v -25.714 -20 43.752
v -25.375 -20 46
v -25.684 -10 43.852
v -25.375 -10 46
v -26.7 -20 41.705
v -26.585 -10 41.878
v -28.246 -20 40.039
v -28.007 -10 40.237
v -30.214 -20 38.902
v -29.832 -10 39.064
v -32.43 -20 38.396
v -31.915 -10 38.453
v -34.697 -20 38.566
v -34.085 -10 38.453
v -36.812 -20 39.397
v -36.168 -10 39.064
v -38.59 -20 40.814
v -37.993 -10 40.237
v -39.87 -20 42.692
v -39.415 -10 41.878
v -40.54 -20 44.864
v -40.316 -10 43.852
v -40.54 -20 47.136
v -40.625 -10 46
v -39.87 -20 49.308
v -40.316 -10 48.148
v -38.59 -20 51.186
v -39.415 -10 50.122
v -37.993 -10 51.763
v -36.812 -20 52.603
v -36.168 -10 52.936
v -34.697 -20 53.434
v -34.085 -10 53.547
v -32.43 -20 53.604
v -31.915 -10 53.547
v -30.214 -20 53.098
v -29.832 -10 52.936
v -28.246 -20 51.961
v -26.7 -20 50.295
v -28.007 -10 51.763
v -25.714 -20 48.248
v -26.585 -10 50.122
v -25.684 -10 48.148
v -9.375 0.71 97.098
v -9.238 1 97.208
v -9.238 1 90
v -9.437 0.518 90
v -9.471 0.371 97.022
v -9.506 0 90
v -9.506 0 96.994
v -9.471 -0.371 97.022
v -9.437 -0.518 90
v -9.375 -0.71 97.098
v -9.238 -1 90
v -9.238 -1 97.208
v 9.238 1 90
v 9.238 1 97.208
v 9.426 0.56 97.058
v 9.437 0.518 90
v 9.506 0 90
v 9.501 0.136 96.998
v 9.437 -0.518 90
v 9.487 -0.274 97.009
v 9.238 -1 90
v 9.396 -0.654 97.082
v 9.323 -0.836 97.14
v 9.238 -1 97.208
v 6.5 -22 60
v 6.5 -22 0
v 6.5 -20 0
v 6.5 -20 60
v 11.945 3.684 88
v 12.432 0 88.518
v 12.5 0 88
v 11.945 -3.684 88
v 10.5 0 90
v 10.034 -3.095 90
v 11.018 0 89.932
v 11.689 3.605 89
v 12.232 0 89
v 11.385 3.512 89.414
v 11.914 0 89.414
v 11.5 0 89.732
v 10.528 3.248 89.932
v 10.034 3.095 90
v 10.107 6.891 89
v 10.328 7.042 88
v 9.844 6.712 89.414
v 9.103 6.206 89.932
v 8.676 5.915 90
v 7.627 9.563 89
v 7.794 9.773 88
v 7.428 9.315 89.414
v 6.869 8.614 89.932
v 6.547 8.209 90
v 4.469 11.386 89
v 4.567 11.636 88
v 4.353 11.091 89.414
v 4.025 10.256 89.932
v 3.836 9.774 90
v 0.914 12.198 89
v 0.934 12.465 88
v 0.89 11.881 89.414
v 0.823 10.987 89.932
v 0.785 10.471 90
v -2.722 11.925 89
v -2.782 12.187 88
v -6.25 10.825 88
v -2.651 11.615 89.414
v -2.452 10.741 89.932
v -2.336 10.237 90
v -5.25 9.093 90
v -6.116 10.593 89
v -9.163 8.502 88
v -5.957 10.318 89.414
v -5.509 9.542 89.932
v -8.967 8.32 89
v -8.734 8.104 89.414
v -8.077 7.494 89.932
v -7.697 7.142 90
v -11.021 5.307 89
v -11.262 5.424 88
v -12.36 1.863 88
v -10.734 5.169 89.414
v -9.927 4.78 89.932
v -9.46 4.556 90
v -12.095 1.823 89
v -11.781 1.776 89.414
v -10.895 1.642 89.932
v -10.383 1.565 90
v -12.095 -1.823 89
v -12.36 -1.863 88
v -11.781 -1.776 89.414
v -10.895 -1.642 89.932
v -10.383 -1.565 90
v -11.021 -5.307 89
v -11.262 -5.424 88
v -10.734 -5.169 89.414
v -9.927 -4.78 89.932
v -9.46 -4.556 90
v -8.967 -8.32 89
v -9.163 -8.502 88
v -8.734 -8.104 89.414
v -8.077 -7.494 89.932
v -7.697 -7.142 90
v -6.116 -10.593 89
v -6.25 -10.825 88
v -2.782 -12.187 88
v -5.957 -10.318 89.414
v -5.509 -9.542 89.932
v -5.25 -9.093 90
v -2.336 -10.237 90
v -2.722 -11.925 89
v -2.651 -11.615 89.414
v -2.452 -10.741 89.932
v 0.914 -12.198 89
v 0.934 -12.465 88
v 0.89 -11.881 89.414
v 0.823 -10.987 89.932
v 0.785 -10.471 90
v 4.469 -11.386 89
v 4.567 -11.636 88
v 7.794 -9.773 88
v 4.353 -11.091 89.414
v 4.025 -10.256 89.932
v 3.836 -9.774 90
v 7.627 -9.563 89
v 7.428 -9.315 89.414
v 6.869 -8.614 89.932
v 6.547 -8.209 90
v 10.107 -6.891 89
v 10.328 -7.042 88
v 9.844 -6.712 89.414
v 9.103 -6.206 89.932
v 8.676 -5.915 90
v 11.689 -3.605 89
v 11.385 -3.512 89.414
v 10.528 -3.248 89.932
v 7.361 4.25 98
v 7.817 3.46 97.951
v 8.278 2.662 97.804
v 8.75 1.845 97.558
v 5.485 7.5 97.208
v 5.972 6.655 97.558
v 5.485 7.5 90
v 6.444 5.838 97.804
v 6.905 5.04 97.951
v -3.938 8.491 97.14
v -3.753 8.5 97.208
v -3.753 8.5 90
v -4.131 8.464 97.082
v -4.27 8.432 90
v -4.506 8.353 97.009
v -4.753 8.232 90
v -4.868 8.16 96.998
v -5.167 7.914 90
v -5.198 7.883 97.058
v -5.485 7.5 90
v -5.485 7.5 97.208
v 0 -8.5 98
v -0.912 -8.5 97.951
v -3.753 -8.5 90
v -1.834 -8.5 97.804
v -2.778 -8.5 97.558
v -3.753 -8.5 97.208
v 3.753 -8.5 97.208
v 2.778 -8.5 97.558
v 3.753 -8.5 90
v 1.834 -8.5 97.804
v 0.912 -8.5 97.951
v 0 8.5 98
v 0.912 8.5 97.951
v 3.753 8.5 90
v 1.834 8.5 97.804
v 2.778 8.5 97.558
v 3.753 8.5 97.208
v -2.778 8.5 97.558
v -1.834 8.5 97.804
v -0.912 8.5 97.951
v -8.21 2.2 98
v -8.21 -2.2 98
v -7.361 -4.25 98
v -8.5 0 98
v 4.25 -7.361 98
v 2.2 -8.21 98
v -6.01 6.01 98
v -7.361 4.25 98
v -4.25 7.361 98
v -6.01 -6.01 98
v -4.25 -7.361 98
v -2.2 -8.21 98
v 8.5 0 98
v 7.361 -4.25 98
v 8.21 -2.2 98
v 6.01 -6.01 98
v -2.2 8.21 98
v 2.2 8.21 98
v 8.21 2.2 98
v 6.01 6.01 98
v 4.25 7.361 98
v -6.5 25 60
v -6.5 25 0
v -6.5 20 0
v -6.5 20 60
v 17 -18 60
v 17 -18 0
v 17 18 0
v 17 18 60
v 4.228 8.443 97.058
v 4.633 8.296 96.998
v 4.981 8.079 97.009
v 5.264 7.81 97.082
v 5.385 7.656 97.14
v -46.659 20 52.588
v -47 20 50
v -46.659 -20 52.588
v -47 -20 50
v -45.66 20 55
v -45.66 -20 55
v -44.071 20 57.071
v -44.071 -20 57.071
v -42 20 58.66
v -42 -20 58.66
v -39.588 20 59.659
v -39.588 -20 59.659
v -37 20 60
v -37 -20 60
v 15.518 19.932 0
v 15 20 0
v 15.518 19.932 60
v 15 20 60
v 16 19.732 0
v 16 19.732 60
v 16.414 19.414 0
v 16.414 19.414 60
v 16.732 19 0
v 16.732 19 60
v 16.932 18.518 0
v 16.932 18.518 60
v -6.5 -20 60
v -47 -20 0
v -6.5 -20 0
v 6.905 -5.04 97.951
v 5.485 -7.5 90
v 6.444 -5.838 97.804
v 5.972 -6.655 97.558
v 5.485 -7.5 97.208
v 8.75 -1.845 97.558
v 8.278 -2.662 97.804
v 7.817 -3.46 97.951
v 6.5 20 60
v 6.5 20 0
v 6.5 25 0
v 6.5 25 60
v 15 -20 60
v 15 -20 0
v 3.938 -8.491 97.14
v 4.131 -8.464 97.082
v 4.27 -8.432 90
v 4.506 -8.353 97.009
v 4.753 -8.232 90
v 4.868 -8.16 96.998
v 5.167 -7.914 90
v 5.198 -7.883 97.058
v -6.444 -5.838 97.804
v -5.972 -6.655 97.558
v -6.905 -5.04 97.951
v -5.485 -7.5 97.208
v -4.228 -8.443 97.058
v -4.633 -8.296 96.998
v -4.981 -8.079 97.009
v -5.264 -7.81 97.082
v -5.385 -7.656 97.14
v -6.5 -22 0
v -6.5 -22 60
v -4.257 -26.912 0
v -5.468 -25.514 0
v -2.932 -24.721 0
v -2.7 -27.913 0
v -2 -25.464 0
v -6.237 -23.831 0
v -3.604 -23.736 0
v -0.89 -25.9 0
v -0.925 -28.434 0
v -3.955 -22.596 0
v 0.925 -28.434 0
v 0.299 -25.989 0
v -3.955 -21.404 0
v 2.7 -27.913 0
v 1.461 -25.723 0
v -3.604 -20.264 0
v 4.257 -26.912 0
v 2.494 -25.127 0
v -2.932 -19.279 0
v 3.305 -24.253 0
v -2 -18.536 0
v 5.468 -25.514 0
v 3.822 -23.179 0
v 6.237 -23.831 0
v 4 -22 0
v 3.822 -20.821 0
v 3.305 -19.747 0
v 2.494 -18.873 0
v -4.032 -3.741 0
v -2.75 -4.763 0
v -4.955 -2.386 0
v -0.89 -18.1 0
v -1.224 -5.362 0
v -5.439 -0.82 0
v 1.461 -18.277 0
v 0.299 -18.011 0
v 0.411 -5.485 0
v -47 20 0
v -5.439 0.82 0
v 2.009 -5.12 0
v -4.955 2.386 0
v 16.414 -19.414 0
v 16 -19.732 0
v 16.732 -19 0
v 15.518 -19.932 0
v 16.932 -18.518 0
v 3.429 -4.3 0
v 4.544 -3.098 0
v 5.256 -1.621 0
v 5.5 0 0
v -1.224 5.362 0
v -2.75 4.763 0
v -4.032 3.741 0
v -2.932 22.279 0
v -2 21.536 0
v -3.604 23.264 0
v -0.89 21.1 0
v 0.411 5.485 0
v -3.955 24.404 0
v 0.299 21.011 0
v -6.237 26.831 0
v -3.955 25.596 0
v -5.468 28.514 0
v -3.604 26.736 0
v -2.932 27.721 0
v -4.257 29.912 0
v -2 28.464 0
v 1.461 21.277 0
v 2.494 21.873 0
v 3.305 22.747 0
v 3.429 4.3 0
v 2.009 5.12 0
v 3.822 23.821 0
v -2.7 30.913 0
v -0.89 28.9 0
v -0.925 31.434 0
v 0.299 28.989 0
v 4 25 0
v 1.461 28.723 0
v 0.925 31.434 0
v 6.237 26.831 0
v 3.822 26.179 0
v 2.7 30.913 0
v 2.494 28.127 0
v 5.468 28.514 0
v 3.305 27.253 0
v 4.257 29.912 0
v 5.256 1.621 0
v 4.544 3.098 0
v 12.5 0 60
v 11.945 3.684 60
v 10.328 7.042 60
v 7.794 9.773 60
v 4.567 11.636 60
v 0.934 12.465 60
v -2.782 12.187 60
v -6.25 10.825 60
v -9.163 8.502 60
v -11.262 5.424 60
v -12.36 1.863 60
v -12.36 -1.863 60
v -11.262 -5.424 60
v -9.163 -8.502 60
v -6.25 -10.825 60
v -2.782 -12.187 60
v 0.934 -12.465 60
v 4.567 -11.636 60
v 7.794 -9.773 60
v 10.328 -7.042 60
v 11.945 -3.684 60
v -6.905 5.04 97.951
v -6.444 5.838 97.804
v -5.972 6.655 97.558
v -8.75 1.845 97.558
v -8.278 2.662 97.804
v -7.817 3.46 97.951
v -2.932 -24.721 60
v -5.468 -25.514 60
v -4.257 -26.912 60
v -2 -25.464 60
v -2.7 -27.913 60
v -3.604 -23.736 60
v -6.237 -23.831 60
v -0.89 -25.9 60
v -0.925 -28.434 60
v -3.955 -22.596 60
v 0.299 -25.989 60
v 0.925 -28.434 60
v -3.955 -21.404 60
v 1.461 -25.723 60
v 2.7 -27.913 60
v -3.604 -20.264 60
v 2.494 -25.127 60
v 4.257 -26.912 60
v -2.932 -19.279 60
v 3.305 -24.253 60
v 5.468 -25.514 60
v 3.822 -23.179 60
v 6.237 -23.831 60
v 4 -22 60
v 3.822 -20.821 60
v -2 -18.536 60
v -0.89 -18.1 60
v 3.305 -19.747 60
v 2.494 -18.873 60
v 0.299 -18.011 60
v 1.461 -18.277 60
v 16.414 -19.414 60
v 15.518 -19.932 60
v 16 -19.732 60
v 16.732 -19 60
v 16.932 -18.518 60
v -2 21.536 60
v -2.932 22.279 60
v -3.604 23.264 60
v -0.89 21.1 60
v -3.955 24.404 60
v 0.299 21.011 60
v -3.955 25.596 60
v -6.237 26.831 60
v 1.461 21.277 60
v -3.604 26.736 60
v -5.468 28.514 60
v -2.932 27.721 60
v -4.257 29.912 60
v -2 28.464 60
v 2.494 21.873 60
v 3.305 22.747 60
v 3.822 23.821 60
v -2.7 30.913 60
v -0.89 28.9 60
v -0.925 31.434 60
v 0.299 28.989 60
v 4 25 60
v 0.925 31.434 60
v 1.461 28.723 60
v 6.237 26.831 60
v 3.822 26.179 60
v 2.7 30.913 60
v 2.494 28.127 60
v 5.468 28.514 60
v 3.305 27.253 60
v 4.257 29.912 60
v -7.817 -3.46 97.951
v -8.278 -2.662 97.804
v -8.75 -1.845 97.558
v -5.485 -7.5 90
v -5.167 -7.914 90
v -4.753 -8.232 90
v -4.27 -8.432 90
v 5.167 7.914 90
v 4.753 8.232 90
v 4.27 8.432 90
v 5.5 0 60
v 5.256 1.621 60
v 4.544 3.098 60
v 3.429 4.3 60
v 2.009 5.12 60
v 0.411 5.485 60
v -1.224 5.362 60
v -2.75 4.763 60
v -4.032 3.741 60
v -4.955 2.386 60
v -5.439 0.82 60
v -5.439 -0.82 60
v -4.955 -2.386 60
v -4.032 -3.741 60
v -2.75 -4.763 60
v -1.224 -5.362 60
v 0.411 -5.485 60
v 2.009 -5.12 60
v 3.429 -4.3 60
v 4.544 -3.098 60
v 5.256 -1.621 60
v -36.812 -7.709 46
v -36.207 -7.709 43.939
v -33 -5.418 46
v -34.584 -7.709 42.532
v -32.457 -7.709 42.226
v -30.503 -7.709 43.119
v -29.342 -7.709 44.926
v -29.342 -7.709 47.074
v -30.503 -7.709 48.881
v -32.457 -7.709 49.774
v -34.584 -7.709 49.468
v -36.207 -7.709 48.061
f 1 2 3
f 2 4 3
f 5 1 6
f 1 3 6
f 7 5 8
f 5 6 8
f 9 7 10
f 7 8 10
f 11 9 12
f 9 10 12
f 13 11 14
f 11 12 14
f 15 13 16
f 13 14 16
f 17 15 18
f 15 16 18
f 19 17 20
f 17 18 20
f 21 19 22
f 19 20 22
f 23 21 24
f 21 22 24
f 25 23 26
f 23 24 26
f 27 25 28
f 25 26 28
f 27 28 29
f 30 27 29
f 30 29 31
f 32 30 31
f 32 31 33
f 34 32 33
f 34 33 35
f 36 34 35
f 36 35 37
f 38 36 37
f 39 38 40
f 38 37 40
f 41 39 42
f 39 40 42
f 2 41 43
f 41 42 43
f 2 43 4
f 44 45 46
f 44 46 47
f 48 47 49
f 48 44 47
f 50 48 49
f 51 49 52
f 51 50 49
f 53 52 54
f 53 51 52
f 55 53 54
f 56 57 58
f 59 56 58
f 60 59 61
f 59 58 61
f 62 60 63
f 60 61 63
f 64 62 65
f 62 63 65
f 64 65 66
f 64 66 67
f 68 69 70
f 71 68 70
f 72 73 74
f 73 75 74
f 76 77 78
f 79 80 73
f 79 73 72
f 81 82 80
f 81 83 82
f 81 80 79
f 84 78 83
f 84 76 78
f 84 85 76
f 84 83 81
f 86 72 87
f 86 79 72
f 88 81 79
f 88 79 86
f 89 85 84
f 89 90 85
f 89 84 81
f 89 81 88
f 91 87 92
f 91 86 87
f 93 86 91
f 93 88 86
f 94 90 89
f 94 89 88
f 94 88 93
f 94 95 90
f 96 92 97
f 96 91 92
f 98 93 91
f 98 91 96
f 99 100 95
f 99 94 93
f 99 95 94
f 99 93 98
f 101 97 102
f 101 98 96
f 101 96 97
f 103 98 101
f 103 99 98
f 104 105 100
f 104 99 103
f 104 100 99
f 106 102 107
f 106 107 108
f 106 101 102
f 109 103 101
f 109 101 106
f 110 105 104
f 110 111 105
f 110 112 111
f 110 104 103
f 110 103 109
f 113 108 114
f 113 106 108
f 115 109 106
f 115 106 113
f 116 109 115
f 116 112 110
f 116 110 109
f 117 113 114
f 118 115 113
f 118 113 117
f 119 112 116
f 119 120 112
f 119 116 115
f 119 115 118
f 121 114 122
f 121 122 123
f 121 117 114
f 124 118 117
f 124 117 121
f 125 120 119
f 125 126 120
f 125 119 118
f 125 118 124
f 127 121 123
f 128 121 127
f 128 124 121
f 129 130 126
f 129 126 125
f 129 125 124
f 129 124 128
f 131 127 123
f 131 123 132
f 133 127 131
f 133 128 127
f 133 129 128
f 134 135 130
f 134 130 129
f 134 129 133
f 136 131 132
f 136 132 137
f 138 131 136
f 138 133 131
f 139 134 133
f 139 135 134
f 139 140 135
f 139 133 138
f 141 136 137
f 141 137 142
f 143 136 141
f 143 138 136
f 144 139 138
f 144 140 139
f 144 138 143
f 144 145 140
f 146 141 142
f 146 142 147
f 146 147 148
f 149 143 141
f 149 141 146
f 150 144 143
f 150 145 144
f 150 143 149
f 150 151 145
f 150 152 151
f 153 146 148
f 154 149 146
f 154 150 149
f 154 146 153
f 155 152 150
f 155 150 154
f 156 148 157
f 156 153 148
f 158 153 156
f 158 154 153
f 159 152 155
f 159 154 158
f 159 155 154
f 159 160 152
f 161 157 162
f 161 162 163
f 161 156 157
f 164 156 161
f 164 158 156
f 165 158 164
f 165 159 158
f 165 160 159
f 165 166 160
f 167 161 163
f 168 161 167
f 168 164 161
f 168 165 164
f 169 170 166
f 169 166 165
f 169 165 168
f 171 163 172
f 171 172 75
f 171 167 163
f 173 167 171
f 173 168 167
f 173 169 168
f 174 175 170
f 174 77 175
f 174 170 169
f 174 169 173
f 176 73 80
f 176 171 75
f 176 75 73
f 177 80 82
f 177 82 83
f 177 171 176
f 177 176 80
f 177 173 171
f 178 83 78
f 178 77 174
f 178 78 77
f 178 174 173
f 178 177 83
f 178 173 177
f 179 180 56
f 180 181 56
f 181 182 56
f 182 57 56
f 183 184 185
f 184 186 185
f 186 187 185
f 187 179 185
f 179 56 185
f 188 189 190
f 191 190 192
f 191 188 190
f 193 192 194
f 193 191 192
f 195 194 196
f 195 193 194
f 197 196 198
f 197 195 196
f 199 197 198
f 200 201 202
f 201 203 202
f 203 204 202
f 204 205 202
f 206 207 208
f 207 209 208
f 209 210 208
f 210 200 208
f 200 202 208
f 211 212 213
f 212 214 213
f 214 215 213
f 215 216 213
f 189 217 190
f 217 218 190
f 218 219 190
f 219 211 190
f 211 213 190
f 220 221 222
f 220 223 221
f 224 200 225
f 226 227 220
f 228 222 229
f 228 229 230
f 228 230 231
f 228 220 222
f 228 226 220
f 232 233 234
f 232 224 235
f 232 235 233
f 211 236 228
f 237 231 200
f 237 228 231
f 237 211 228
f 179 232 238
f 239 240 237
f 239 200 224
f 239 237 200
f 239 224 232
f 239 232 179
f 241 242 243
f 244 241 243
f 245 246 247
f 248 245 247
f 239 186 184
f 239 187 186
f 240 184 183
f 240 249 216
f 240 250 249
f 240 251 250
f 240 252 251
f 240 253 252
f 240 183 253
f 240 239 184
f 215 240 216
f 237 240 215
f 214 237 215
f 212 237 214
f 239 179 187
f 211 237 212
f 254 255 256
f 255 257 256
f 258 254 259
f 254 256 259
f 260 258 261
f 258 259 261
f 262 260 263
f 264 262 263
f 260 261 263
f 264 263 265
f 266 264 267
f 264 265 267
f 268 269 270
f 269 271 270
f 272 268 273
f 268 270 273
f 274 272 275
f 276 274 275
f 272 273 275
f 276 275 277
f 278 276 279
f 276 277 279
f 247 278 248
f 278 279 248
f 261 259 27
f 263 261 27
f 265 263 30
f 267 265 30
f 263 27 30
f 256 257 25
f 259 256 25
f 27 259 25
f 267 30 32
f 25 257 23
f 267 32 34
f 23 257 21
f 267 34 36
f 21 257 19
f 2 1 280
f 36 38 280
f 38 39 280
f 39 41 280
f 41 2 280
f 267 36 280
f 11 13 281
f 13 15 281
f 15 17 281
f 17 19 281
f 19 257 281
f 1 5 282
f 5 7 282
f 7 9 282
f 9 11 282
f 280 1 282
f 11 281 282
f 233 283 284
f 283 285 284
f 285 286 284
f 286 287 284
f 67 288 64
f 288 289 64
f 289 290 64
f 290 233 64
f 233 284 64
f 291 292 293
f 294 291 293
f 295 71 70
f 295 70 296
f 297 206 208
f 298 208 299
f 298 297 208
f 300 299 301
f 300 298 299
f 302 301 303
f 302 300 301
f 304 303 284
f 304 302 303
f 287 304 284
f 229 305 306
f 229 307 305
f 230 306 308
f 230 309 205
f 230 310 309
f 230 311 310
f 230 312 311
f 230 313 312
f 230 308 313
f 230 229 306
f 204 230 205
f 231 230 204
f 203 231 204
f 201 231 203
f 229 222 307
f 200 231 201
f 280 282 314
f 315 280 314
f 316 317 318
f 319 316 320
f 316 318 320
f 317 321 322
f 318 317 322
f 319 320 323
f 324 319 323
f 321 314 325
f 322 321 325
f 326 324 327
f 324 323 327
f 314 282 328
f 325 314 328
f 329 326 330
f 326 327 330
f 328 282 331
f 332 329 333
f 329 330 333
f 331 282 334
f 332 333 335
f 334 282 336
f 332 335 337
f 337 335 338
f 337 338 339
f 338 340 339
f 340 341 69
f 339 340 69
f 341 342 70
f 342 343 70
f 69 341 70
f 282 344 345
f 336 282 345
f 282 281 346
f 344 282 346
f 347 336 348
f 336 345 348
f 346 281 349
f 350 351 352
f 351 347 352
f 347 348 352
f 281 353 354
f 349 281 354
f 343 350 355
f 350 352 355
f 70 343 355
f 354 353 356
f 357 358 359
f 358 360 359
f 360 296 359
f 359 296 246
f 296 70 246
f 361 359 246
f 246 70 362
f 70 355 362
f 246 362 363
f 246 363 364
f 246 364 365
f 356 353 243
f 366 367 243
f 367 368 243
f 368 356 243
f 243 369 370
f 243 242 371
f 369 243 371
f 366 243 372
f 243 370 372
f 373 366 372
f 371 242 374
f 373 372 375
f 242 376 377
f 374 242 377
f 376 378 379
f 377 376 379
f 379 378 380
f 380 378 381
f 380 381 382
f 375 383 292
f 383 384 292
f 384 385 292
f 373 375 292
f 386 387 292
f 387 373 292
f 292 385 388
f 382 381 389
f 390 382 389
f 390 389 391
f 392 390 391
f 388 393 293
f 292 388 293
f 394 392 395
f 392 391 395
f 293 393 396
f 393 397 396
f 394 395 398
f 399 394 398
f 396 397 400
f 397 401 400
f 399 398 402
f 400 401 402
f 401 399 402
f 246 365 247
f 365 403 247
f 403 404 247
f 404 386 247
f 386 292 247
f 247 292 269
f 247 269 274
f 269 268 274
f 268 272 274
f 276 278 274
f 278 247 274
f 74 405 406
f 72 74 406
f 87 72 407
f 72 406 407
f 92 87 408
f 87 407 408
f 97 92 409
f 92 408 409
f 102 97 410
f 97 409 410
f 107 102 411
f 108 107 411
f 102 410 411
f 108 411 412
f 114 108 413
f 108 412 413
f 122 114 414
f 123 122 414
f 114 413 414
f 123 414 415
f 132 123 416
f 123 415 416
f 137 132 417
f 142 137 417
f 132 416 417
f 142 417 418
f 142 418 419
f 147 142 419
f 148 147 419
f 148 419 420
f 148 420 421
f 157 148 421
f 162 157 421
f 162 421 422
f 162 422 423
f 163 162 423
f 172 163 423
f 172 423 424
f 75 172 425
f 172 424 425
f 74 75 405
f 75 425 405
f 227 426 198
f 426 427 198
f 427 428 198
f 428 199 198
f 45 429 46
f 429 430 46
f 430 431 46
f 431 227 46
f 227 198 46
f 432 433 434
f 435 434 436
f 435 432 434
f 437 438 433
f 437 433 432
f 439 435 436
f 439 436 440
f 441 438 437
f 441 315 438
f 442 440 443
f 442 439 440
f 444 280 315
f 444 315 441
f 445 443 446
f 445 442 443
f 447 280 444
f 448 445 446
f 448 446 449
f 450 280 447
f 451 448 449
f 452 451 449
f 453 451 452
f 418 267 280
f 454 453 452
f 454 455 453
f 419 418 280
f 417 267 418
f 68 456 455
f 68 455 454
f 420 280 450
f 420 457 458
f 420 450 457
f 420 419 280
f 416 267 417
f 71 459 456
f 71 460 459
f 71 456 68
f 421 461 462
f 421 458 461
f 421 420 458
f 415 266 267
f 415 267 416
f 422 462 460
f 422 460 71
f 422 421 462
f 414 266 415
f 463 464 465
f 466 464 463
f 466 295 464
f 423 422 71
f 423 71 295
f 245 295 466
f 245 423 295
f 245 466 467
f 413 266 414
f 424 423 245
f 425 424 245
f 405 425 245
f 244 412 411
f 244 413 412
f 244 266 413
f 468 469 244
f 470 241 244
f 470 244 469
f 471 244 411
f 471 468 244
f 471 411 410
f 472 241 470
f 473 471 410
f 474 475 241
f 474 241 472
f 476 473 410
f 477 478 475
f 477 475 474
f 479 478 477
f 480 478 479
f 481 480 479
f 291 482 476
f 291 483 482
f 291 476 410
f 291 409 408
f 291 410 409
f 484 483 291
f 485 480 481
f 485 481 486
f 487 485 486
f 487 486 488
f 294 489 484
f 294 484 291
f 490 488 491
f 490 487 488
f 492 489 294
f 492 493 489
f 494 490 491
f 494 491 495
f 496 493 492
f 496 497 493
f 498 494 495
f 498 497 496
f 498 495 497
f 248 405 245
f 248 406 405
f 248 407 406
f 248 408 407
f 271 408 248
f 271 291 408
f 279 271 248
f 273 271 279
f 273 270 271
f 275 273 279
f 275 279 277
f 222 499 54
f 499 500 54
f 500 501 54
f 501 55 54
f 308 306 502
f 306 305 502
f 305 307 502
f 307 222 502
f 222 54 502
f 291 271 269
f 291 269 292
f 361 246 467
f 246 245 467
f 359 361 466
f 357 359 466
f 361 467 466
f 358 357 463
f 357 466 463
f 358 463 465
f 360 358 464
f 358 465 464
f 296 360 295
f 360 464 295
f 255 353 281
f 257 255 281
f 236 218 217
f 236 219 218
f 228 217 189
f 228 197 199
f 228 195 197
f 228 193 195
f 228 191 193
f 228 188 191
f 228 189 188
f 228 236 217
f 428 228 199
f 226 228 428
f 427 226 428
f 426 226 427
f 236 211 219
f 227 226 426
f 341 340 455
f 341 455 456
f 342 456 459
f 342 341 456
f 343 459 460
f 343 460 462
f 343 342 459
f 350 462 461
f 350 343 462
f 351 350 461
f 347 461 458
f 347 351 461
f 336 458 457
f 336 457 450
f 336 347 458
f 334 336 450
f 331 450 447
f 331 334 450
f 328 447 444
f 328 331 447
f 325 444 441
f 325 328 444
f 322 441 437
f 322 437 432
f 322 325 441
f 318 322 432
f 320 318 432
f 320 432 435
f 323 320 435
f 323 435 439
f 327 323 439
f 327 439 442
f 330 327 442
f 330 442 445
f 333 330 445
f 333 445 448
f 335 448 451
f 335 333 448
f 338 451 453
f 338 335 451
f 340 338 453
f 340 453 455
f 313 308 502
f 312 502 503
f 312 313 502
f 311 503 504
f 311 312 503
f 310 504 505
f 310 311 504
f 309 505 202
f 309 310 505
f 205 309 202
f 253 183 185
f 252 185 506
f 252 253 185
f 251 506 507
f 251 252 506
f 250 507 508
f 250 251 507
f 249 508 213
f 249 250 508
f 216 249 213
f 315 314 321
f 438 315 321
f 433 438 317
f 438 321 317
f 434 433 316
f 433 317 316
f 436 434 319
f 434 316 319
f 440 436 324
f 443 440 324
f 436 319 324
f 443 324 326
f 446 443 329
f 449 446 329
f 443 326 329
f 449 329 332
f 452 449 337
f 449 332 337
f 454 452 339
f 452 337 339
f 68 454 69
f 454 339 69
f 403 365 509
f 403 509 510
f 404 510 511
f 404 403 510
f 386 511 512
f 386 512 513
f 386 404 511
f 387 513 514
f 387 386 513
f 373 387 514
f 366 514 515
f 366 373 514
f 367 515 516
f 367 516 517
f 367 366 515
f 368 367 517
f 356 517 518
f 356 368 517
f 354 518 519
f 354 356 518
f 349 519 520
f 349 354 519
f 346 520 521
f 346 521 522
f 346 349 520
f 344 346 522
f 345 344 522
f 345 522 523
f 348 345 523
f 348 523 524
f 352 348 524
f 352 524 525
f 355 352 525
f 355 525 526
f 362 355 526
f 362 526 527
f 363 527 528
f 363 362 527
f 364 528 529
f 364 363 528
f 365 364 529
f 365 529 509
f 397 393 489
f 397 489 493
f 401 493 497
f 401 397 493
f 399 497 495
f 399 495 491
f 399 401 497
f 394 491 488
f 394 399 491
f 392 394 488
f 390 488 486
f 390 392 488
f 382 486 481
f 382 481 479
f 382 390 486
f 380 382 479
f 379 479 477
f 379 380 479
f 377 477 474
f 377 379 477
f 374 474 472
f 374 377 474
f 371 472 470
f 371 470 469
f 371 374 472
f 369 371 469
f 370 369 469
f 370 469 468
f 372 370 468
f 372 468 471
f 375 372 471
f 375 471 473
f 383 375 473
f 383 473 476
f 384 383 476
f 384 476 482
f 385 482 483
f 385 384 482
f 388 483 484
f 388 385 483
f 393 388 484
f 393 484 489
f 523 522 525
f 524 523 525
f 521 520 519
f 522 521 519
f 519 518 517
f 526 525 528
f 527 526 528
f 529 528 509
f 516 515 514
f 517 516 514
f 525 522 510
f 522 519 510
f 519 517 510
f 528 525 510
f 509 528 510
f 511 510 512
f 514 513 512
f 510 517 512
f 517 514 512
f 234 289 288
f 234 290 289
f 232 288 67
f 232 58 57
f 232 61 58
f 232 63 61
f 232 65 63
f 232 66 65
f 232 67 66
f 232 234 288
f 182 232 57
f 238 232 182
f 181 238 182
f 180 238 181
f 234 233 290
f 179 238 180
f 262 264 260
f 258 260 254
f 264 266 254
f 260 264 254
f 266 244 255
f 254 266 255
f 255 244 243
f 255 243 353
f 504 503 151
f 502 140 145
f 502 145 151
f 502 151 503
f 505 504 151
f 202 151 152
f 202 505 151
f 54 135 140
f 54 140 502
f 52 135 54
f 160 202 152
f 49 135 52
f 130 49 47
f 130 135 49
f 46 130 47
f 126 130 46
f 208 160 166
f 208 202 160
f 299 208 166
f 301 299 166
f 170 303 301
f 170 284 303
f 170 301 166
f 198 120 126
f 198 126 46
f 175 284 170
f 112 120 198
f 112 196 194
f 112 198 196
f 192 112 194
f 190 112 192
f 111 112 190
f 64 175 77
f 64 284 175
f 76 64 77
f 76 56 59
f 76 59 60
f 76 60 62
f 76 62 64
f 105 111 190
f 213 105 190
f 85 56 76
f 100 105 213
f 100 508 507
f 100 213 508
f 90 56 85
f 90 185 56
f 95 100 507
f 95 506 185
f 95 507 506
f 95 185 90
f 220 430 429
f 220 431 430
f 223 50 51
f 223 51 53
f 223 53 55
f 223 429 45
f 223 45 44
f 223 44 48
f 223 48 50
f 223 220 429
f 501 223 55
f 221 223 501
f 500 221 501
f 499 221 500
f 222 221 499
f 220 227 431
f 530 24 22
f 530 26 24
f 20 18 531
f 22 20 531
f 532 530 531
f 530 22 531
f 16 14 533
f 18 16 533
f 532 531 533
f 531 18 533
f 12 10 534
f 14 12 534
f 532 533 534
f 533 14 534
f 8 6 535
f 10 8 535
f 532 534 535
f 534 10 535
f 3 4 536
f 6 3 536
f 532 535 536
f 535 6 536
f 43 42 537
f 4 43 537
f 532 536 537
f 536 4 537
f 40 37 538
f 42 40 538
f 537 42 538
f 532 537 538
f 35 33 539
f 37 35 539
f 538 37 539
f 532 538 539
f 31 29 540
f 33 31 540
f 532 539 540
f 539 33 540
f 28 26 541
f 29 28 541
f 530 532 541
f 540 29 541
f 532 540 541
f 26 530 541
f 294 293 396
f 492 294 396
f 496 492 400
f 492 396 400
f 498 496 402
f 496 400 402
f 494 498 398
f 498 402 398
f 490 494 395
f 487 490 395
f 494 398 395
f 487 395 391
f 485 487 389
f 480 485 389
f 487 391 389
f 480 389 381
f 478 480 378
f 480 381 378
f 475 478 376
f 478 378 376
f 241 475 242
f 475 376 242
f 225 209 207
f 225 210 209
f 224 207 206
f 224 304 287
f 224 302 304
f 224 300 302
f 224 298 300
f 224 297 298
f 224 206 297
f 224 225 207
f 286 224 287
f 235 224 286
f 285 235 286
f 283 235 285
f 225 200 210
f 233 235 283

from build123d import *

# Parameters (mm, degrees)
SKETCH_1_R               = 4
SKETCH_1_R_2             = 5.5
EXTRUDE_1_DEPTH          = 60
FILLET_1_R               = 10
SKETCH_2_R               = 12.5
EXTRUDE_2_DEPTH          = 30
HOLE_WIZARD_G3_8_1_D     = 15.25
HOLE_WIZARD_G3_8_1_DEPTH = 10
HOLE_WIZARD_G3_8_1_TIP   = 4.58156222
EXTRUDE_3_DEPTH          = 8
FILLET_2_R               = 2
FILLET_3_R               = 2


with BuildPart() as part:
    # 草图1 → 凸台-拉伸1 (new body)
    with BuildSketch(Plane.XY):
        with BuildLine():
            Line((-6.5, 25), (-6.5, 20))
            Line((-6.5, 20), (-47, 20))
            Line((-47, 20), (-47, -20))
            Line((-47, -20), (-6.5, -20))
            Line((-6.5, -20), (-6.5, -22))
            ThreePointArc((-6.5, -22), (0, -28.5), (6.5, -22))
            Line((6.5, -22), (6.5, -20))
            Line((6.5, -20), (17, -20))
            Line((17, -20), (17, 20))
            Line((17, 20), (6.5, 20))
            Line((6.5, 20), (6.5, 25))
            ThreePointArc((6.5, 25), (0, 31.5), (-6.5, 25))
        make_face()
        with Locations((0, 25)):
            Circle(SKETCH_1_R, mode=Mode.SUBTRACT)
        with Locations((0, -22)):
            Circle(SKETCH_1_R, mode=Mode.SUBTRACT)
        Circle(SKETCH_1_R_2, mode=Mode.SUBTRACT)
    extrude(amount=EXTRUDE_1_DEPTH)

    # 圆角1
    fillet_1_edges = [part.edges().sort_by_distance(p)[0] for p in [
        (-47, 0, 60),
    ]]
    fillet(fillet_1_edges, radius=FILLET_1_R)

    # 草图2 → 凸台-拉伸2 (add)
    with BuildSketch(Plane.XY.offset(60)):
        Circle(SKETCH_2_R)
    extrude(amount=EXTRUDE_2_DEPTH)

    # G3/8 螺纹孔1
    with Locations(Plane(origin=(0, -20, 0), x_dir=(-1, 0, 0), z_dir=(0, -1, 0))):
        with Locations((33, -46)):
            Hole(HOLE_WIZARD_G3_8_1_D / 2, depth=HOLE_WIZARD_G3_8_1_DEPTH)
            with Locations((0, 0, -(HOLE_WIZARD_G3_8_1_DEPTH + HOLE_WIZARD_G3_8_1_TIP / 2))):  # 118° drill point
                Cone(0, HOLE_WIZARD_G3_8_1_D / 2, HOLE_WIZARD_G3_8_1_TIP, mode=Mode.SUBTRACT)

    # 草图6 → 凸台-拉伸3 (add)
    with BuildSketch(Plane.XY.offset(90)):
        Polygon((9.814954576, 0), (4.907477288, 8.5), (-4.907477288, 8.5), (-9.814954576, 0), (-4.907477288, -8.5), (4.907477288, -8.5), align=None)
    extrude(amount=EXTRUDE_3_DEPTH)

    # 圆角2
    fillet_2_edges = [part.edges().sort_by_distance(p)[0] for p in [
        (17, 20, 30),
        (17, -20, 30),
        (-12.5, 0, 90),
    ]]
    fillet(fillet_2_edges, radius=FILLET_2_R)

    # 圆角3
    fillet_3_edges = [part.edges().sort_by_distance(p)[0] for p in [
        (4.907477288, -8.5, 94),
        (9.814954576, 0, 94),
        (4.907477288, 8.5, 94),
        (-4.907477288, 8.5, 94),
        (-9.814954576, 0, 94),
        (-4.907477288, -8.5, 94),
    ]]
    fillet(fillet_3_edges, radius=FILLET_3_R)

    # 草图7 → 切除-旋转1 (revolve, cut)
    with BuildSketch(Plane(origin=(0, 0, 0), x_dir=(1, 0, 0), z_dir=(0, 1, 0))):
        Polygon((-9.505553499, -96.994446501), (-8.5, -98), (-9.505553499, -98), align=None)
    revolve(axis=Axis((0, 0, -9.70684158), (0, 0, 1)), mode=Mode.SUBTRACT)


solid = part.part
